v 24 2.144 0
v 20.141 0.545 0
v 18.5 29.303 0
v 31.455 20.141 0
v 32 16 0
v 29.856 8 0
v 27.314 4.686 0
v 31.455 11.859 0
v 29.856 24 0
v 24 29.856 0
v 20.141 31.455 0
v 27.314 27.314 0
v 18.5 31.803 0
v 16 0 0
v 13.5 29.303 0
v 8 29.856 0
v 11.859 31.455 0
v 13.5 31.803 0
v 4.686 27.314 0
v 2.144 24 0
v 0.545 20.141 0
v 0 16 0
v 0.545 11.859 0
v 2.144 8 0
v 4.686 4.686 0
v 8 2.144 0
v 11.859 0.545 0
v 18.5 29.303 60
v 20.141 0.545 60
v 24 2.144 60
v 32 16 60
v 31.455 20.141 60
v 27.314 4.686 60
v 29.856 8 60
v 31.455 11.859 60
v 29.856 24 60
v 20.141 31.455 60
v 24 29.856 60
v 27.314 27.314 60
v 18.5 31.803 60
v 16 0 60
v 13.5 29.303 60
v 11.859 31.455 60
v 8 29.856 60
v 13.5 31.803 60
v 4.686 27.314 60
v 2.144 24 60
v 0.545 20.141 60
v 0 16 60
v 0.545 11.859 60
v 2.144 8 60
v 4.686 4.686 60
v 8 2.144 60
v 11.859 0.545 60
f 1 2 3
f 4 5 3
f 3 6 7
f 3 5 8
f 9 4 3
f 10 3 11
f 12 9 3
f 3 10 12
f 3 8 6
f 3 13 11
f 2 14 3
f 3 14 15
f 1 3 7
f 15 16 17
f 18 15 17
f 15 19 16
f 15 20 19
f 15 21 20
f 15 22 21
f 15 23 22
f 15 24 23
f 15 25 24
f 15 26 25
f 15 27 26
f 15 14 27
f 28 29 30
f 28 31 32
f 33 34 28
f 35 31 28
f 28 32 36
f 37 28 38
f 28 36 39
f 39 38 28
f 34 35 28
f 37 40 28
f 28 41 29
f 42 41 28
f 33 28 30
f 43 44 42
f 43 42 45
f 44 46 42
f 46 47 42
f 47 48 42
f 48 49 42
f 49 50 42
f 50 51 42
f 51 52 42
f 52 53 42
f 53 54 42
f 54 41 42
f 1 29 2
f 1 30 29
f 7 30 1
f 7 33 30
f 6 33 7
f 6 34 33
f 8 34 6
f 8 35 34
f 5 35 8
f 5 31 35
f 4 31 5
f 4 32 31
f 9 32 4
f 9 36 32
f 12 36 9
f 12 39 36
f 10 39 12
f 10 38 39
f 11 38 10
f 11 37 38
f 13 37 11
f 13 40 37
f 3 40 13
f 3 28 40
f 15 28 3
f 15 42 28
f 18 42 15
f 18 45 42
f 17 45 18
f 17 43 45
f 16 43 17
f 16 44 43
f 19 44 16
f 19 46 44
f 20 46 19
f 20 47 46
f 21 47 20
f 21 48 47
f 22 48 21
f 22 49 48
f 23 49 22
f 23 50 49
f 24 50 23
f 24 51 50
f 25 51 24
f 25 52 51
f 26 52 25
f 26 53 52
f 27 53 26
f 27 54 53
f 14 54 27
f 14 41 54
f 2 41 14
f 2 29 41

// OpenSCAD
$fn = 32;

// ----------------------------------------------------------------------
// Keyway shaft: d32 shaft, key 5 x 2.5 mm
// ----------------------------------------------------------------------

// --- parameters (mm) ---
shaft_r = 16;             // shaft radius
key_w = 5;                // keyway width
key_d = 2.5;              // keyway depth below the surface line
plate_t = 60;             // shaft length, Z (extrusion height)
fit_tol = 0.05;           // declared fit tolerance (prompt contract)
free_tol = 0.2;           // declared free tolerance (prompt contract)

shaft_d = 2 * shaft_r;  // shaft diameter
circle_step = 15;  // polygon sampling step, degrees

profile = [[11.859, 31.455], [8, 29.856], [4.686, 27.314], [2.144, 24], [0.545, 20.141], [0, 16], [0.545, 11.859], [2.144, 8], [4.686, 4.686], [8, 2.144], [11.859, 0.545], [16, 0], [20.141, 0.545], [24, 2.144], [27.314, 4.686], [29.856, 8], [31.455, 11.859], [32, 16], [31.455, 20.141], [29.856, 24], [27.314, 27.314], [24, 29.856], [20.141, 31.455], [18.5, 31.803], [18.5, 29.303], [13.5, 29.303], [13.5, 31.803]];  // primary outline, 27 points, counter clockwise

// --- the one profile operation ---
linear_extrude(height = plate_t) polygon(points = profile);
